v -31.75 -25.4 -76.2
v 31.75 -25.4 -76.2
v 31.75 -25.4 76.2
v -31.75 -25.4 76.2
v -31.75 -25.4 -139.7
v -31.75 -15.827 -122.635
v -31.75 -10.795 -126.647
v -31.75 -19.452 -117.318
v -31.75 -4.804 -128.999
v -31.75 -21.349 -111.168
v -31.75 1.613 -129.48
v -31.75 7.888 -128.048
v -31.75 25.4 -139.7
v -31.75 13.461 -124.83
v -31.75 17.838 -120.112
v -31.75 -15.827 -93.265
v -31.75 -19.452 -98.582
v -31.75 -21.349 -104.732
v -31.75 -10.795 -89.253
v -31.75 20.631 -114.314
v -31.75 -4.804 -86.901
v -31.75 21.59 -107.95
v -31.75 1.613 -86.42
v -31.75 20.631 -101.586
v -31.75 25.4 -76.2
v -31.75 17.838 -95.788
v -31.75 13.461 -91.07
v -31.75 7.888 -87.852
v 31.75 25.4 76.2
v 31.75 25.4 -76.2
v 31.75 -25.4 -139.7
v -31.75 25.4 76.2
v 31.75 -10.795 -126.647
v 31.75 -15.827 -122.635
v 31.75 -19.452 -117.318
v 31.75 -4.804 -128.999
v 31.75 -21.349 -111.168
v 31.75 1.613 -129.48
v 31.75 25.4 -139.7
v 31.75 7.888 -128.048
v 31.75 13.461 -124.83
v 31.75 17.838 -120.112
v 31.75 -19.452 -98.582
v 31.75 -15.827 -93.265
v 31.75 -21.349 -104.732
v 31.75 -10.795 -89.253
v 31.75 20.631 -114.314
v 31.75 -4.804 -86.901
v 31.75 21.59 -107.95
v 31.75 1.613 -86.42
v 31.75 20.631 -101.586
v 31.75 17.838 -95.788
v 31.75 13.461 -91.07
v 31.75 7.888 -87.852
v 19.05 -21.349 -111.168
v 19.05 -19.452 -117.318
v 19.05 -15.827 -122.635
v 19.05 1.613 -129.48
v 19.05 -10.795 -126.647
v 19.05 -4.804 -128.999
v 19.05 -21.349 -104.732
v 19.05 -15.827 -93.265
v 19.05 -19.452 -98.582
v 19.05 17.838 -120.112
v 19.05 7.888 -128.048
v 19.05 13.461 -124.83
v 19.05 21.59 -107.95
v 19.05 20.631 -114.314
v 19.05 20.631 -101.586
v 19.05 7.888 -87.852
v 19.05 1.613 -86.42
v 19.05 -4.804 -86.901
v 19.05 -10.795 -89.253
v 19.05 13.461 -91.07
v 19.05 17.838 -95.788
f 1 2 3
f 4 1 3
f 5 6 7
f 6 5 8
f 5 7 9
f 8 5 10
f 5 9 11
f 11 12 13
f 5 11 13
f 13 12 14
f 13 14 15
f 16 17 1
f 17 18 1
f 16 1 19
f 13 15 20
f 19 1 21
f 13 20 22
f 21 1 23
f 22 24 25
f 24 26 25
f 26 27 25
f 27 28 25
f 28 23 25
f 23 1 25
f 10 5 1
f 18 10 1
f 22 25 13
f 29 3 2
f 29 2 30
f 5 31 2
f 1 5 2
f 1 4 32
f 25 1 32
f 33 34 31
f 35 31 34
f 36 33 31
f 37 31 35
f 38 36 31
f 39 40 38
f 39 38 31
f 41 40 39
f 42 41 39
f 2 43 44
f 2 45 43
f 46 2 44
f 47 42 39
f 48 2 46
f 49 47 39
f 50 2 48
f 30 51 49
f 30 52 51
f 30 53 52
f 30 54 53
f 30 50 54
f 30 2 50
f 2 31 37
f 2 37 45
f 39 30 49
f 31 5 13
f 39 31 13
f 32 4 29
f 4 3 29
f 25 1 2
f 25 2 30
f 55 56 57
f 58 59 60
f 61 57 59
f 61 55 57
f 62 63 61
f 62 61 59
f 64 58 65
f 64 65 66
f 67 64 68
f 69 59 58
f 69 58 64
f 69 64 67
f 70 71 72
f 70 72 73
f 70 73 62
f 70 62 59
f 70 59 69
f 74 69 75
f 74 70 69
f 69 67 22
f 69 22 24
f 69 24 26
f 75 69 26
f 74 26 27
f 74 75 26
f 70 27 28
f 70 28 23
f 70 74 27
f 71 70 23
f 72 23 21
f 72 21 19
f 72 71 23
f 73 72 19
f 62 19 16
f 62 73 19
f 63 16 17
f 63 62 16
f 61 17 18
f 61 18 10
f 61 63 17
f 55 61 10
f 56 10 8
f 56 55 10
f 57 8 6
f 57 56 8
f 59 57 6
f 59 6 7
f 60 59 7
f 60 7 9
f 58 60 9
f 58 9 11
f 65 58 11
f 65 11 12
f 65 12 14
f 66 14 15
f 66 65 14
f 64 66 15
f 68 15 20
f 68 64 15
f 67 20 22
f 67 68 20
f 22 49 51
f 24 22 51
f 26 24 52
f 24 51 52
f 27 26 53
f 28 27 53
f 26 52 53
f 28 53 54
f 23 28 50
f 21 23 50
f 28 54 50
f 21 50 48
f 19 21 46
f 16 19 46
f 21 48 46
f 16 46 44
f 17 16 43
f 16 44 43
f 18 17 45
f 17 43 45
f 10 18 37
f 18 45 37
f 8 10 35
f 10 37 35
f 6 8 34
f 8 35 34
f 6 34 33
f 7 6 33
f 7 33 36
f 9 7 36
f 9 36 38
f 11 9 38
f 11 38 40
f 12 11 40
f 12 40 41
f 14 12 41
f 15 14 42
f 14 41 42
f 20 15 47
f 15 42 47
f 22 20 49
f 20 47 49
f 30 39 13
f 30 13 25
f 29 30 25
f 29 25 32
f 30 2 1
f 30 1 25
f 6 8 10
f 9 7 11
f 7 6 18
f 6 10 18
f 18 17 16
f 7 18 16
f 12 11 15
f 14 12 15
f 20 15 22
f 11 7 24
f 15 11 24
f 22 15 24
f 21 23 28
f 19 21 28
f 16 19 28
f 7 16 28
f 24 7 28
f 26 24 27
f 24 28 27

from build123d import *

# Parameters (mm, degrees)
F0_W     = 50.8
F0_H     = 152.4
F1_DEPTH = 31.75
F2_W     = 50.8
F2_H     = 63.5
F2_R     = 21.59
F3_DEPTH = 63.5
F5_START = -12.7
F4_R     = 21.59
F5_DEPTH = 50.8


with BuildPart() as f1:
    # F0 (on Right) → F1 (new body, symmetric)
    with BuildSketch(Plane.YZ):
        Rectangle(F0_W, F0_H)
    extrude(amount=F1_DEPTH, both=True)


with BuildPart() as f3:
    # F2 (on face) → F3 (new body)
    with BuildSketch(Plane.YZ.offset(31.75)):
        with Locations((0, -107.95)):
            Rectangle(F2_W, F2_H)
        with Locations((0, -107.95)):
            Circle(F2_R, mode=Mode.SUBTRACT)
    extrude(amount=-F3_DEPTH)


with BuildPart() as f5:
    # F4 (on face) → F5 (new body)
    with BuildSketch(Plane.YZ.offset(31.75).offset(F5_START)):
        with Locations((0, -107.95)):
            Circle(F4_R)
    extrude(amount=-F5_DEPTH)


solid = Compound([f1.part, f3.part, f5.part])
